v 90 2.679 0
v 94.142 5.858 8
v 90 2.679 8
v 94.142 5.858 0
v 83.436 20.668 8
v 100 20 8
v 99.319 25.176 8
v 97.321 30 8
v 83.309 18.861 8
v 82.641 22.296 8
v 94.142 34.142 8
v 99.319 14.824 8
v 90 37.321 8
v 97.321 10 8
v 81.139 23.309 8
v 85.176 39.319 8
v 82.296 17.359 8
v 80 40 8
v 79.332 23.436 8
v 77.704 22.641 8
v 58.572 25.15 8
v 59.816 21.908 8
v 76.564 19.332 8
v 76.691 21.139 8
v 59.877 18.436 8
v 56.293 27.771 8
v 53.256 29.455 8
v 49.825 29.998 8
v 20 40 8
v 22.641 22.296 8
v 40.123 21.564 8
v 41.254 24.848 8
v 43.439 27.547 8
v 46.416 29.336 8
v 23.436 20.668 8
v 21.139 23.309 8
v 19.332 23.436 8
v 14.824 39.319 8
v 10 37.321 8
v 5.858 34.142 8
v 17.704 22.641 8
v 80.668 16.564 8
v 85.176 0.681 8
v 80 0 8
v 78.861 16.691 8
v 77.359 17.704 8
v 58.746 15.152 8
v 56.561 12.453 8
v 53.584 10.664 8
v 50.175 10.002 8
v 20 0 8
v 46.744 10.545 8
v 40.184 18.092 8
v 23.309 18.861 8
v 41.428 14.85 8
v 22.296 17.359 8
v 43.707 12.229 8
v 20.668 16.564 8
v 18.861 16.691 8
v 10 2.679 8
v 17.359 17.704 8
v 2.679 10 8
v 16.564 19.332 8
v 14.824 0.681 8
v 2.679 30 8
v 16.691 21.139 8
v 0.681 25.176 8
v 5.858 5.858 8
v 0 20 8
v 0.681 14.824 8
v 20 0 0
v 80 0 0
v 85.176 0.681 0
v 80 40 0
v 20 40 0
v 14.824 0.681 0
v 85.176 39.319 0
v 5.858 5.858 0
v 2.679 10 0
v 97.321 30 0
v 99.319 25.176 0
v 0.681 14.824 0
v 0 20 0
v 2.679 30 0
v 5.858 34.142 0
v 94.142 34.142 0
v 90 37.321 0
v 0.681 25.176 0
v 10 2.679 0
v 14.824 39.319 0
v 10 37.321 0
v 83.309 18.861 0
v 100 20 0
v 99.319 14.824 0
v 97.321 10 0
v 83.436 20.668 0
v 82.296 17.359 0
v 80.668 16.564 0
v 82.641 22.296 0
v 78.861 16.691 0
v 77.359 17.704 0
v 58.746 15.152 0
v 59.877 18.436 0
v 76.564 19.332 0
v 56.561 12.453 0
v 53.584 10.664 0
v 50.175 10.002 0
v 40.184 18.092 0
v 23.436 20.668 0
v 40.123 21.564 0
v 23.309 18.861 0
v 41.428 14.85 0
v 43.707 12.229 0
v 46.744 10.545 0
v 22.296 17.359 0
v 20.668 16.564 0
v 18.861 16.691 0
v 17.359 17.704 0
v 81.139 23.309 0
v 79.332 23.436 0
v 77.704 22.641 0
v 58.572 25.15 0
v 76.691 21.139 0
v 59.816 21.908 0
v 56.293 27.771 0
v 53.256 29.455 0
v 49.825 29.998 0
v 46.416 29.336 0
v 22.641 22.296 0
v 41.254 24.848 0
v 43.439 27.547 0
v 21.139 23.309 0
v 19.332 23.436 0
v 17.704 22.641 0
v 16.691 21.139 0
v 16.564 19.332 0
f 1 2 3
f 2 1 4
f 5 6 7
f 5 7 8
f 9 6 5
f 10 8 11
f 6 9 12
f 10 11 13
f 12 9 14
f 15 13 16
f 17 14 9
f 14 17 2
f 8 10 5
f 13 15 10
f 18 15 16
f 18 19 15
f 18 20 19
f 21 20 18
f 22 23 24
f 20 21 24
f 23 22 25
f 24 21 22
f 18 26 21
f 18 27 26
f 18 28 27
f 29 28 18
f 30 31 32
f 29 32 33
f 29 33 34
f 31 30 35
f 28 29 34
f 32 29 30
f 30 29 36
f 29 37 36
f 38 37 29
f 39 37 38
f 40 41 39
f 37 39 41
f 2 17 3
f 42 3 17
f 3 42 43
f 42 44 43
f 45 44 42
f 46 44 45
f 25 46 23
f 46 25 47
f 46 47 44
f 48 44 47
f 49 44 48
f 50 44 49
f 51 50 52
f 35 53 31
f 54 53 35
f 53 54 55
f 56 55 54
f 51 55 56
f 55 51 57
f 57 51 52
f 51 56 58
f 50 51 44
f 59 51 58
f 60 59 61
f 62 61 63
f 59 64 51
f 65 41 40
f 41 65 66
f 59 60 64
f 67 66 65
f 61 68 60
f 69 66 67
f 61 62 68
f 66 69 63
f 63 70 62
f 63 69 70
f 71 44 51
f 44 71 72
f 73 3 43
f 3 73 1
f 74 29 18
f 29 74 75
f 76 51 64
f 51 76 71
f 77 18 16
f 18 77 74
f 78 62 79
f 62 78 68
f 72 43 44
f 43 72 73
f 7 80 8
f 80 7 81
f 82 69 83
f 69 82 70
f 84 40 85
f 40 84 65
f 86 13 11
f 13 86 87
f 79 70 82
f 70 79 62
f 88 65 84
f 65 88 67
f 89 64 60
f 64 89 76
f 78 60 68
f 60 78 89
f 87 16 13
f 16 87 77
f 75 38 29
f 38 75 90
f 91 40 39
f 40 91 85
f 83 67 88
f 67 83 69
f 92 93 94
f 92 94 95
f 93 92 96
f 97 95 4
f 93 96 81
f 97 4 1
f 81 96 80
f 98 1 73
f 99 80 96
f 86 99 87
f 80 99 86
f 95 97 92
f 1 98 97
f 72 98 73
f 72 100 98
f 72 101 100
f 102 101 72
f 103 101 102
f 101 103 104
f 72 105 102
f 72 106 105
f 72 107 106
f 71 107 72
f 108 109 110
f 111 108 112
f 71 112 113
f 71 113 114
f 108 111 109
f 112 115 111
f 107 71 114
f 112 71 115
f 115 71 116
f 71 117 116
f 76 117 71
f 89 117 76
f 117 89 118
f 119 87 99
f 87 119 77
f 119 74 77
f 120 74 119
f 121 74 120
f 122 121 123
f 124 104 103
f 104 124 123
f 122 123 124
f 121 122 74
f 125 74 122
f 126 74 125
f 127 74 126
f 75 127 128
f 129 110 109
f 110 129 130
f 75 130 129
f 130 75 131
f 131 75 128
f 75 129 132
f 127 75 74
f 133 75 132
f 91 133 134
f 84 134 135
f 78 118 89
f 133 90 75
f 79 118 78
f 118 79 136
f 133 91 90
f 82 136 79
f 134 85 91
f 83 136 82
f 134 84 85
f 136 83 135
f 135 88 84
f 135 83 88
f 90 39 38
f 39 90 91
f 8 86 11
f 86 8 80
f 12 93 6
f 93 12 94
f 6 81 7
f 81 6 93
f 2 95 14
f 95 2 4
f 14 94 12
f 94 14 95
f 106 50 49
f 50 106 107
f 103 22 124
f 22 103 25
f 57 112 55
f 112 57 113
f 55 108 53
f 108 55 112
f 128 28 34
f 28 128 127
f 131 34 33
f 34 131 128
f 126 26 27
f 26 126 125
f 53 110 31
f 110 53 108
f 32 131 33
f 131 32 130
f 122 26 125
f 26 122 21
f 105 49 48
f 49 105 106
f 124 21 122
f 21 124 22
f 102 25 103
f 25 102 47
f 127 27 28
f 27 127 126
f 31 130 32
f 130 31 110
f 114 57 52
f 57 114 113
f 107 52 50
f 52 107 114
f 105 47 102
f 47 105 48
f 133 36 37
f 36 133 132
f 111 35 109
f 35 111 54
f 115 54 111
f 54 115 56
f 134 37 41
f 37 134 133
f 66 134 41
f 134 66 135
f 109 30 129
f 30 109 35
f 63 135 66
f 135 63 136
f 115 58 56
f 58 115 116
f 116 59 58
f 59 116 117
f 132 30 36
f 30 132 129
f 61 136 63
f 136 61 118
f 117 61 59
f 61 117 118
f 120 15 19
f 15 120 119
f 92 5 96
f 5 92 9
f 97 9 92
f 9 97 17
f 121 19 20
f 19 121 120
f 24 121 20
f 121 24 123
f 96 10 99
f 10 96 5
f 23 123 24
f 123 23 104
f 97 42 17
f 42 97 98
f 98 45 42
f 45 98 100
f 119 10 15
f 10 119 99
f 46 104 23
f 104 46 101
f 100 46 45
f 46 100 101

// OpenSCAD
$fn = 32;

// ----------------------------------------------------------------------
// Spacer plate: obround span 60, caps R20
// ----------------------------------------------------------------------

// --- parameters (mm) ---
bore_r = 10;              // centre bore radius
bolt_r = 3.5;             // bolt hole radius
plate_t = 8;              // plate thickness, Z (extrusion height)
span = 60;                // obround span
cap_r = 20;               // cap radius

profile = [[20, 40], [14.824, 39.319], [10, 37.321], [5.858, 34.142], [2.679, 30], [0.681, 25.176], [0, 20], [0.681, 14.824], [2.679, 10], [5.858, 5.858], [10, 2.679], [14.824, 0.681], [20, 0], [80, 0], [85.176, 0.681], [90, 2.679], [94.142, 5.858], [97.321, 10], [99.319, 14.824], [100, 20], [99.319, 25.176], [97.321, 30], [94.142, 34.142], [90, 37.321], [85.176, 39.319], [80, 40]];  // primary outline, 26 points, counter clockwise
void_1 = [[59.816, 21.908], [58.572, 25.15], [56.293, 27.771], [53.256, 29.455], [49.825, 29.998], [46.416, 29.336], [43.439, 27.547], [41.254, 24.848], [40.123, 21.564], [40.184, 18.092], [41.428, 14.85], [43.707, 12.229], [46.744, 10.545], [50.175, 10.002], [53.584, 10.664], [56.561, 12.453], [58.746, 15.152], [59.877, 18.436]];  // centre bore, 18 points
void_2 = [[23.436, 20.668], [22.641, 22.296], [21.139, 23.309], [19.332, 23.436], [17.704, 22.641], [16.691, 21.139], [16.564, 19.332], [17.359, 17.704], [18.861, 16.691], [20.668, 16.564], [22.296, 17.359], [23.309, 18.861]];  // end hole, 12 points
void_3 = [[83.436, 20.668], [82.641, 22.296], [81.139, 23.309], [79.332, 23.436], [77.704, 22.641], [76.691, 21.139], [76.564, 19.332], [77.359, 17.704], [78.861, 16.691], [80.668, 16.564], [82.296, 17.359], [83.309, 18.861]];  // end hole, 12 points

// --- the one profile operation ---
difference() {
  linear_extrude(height = plate_t) polygon(points = profile);
  translate([0, 0, -1])
    linear_extrude(height = plate_t + 2) polygon(points = void_1);
  translate([0, 0, -1])
    linear_extrude(height = plate_t + 2) polygon(points = void_2);
  translate([0, 0, -1])
    linear_extrude(height = plate_t + 2) polygon(points = void_3);
}
